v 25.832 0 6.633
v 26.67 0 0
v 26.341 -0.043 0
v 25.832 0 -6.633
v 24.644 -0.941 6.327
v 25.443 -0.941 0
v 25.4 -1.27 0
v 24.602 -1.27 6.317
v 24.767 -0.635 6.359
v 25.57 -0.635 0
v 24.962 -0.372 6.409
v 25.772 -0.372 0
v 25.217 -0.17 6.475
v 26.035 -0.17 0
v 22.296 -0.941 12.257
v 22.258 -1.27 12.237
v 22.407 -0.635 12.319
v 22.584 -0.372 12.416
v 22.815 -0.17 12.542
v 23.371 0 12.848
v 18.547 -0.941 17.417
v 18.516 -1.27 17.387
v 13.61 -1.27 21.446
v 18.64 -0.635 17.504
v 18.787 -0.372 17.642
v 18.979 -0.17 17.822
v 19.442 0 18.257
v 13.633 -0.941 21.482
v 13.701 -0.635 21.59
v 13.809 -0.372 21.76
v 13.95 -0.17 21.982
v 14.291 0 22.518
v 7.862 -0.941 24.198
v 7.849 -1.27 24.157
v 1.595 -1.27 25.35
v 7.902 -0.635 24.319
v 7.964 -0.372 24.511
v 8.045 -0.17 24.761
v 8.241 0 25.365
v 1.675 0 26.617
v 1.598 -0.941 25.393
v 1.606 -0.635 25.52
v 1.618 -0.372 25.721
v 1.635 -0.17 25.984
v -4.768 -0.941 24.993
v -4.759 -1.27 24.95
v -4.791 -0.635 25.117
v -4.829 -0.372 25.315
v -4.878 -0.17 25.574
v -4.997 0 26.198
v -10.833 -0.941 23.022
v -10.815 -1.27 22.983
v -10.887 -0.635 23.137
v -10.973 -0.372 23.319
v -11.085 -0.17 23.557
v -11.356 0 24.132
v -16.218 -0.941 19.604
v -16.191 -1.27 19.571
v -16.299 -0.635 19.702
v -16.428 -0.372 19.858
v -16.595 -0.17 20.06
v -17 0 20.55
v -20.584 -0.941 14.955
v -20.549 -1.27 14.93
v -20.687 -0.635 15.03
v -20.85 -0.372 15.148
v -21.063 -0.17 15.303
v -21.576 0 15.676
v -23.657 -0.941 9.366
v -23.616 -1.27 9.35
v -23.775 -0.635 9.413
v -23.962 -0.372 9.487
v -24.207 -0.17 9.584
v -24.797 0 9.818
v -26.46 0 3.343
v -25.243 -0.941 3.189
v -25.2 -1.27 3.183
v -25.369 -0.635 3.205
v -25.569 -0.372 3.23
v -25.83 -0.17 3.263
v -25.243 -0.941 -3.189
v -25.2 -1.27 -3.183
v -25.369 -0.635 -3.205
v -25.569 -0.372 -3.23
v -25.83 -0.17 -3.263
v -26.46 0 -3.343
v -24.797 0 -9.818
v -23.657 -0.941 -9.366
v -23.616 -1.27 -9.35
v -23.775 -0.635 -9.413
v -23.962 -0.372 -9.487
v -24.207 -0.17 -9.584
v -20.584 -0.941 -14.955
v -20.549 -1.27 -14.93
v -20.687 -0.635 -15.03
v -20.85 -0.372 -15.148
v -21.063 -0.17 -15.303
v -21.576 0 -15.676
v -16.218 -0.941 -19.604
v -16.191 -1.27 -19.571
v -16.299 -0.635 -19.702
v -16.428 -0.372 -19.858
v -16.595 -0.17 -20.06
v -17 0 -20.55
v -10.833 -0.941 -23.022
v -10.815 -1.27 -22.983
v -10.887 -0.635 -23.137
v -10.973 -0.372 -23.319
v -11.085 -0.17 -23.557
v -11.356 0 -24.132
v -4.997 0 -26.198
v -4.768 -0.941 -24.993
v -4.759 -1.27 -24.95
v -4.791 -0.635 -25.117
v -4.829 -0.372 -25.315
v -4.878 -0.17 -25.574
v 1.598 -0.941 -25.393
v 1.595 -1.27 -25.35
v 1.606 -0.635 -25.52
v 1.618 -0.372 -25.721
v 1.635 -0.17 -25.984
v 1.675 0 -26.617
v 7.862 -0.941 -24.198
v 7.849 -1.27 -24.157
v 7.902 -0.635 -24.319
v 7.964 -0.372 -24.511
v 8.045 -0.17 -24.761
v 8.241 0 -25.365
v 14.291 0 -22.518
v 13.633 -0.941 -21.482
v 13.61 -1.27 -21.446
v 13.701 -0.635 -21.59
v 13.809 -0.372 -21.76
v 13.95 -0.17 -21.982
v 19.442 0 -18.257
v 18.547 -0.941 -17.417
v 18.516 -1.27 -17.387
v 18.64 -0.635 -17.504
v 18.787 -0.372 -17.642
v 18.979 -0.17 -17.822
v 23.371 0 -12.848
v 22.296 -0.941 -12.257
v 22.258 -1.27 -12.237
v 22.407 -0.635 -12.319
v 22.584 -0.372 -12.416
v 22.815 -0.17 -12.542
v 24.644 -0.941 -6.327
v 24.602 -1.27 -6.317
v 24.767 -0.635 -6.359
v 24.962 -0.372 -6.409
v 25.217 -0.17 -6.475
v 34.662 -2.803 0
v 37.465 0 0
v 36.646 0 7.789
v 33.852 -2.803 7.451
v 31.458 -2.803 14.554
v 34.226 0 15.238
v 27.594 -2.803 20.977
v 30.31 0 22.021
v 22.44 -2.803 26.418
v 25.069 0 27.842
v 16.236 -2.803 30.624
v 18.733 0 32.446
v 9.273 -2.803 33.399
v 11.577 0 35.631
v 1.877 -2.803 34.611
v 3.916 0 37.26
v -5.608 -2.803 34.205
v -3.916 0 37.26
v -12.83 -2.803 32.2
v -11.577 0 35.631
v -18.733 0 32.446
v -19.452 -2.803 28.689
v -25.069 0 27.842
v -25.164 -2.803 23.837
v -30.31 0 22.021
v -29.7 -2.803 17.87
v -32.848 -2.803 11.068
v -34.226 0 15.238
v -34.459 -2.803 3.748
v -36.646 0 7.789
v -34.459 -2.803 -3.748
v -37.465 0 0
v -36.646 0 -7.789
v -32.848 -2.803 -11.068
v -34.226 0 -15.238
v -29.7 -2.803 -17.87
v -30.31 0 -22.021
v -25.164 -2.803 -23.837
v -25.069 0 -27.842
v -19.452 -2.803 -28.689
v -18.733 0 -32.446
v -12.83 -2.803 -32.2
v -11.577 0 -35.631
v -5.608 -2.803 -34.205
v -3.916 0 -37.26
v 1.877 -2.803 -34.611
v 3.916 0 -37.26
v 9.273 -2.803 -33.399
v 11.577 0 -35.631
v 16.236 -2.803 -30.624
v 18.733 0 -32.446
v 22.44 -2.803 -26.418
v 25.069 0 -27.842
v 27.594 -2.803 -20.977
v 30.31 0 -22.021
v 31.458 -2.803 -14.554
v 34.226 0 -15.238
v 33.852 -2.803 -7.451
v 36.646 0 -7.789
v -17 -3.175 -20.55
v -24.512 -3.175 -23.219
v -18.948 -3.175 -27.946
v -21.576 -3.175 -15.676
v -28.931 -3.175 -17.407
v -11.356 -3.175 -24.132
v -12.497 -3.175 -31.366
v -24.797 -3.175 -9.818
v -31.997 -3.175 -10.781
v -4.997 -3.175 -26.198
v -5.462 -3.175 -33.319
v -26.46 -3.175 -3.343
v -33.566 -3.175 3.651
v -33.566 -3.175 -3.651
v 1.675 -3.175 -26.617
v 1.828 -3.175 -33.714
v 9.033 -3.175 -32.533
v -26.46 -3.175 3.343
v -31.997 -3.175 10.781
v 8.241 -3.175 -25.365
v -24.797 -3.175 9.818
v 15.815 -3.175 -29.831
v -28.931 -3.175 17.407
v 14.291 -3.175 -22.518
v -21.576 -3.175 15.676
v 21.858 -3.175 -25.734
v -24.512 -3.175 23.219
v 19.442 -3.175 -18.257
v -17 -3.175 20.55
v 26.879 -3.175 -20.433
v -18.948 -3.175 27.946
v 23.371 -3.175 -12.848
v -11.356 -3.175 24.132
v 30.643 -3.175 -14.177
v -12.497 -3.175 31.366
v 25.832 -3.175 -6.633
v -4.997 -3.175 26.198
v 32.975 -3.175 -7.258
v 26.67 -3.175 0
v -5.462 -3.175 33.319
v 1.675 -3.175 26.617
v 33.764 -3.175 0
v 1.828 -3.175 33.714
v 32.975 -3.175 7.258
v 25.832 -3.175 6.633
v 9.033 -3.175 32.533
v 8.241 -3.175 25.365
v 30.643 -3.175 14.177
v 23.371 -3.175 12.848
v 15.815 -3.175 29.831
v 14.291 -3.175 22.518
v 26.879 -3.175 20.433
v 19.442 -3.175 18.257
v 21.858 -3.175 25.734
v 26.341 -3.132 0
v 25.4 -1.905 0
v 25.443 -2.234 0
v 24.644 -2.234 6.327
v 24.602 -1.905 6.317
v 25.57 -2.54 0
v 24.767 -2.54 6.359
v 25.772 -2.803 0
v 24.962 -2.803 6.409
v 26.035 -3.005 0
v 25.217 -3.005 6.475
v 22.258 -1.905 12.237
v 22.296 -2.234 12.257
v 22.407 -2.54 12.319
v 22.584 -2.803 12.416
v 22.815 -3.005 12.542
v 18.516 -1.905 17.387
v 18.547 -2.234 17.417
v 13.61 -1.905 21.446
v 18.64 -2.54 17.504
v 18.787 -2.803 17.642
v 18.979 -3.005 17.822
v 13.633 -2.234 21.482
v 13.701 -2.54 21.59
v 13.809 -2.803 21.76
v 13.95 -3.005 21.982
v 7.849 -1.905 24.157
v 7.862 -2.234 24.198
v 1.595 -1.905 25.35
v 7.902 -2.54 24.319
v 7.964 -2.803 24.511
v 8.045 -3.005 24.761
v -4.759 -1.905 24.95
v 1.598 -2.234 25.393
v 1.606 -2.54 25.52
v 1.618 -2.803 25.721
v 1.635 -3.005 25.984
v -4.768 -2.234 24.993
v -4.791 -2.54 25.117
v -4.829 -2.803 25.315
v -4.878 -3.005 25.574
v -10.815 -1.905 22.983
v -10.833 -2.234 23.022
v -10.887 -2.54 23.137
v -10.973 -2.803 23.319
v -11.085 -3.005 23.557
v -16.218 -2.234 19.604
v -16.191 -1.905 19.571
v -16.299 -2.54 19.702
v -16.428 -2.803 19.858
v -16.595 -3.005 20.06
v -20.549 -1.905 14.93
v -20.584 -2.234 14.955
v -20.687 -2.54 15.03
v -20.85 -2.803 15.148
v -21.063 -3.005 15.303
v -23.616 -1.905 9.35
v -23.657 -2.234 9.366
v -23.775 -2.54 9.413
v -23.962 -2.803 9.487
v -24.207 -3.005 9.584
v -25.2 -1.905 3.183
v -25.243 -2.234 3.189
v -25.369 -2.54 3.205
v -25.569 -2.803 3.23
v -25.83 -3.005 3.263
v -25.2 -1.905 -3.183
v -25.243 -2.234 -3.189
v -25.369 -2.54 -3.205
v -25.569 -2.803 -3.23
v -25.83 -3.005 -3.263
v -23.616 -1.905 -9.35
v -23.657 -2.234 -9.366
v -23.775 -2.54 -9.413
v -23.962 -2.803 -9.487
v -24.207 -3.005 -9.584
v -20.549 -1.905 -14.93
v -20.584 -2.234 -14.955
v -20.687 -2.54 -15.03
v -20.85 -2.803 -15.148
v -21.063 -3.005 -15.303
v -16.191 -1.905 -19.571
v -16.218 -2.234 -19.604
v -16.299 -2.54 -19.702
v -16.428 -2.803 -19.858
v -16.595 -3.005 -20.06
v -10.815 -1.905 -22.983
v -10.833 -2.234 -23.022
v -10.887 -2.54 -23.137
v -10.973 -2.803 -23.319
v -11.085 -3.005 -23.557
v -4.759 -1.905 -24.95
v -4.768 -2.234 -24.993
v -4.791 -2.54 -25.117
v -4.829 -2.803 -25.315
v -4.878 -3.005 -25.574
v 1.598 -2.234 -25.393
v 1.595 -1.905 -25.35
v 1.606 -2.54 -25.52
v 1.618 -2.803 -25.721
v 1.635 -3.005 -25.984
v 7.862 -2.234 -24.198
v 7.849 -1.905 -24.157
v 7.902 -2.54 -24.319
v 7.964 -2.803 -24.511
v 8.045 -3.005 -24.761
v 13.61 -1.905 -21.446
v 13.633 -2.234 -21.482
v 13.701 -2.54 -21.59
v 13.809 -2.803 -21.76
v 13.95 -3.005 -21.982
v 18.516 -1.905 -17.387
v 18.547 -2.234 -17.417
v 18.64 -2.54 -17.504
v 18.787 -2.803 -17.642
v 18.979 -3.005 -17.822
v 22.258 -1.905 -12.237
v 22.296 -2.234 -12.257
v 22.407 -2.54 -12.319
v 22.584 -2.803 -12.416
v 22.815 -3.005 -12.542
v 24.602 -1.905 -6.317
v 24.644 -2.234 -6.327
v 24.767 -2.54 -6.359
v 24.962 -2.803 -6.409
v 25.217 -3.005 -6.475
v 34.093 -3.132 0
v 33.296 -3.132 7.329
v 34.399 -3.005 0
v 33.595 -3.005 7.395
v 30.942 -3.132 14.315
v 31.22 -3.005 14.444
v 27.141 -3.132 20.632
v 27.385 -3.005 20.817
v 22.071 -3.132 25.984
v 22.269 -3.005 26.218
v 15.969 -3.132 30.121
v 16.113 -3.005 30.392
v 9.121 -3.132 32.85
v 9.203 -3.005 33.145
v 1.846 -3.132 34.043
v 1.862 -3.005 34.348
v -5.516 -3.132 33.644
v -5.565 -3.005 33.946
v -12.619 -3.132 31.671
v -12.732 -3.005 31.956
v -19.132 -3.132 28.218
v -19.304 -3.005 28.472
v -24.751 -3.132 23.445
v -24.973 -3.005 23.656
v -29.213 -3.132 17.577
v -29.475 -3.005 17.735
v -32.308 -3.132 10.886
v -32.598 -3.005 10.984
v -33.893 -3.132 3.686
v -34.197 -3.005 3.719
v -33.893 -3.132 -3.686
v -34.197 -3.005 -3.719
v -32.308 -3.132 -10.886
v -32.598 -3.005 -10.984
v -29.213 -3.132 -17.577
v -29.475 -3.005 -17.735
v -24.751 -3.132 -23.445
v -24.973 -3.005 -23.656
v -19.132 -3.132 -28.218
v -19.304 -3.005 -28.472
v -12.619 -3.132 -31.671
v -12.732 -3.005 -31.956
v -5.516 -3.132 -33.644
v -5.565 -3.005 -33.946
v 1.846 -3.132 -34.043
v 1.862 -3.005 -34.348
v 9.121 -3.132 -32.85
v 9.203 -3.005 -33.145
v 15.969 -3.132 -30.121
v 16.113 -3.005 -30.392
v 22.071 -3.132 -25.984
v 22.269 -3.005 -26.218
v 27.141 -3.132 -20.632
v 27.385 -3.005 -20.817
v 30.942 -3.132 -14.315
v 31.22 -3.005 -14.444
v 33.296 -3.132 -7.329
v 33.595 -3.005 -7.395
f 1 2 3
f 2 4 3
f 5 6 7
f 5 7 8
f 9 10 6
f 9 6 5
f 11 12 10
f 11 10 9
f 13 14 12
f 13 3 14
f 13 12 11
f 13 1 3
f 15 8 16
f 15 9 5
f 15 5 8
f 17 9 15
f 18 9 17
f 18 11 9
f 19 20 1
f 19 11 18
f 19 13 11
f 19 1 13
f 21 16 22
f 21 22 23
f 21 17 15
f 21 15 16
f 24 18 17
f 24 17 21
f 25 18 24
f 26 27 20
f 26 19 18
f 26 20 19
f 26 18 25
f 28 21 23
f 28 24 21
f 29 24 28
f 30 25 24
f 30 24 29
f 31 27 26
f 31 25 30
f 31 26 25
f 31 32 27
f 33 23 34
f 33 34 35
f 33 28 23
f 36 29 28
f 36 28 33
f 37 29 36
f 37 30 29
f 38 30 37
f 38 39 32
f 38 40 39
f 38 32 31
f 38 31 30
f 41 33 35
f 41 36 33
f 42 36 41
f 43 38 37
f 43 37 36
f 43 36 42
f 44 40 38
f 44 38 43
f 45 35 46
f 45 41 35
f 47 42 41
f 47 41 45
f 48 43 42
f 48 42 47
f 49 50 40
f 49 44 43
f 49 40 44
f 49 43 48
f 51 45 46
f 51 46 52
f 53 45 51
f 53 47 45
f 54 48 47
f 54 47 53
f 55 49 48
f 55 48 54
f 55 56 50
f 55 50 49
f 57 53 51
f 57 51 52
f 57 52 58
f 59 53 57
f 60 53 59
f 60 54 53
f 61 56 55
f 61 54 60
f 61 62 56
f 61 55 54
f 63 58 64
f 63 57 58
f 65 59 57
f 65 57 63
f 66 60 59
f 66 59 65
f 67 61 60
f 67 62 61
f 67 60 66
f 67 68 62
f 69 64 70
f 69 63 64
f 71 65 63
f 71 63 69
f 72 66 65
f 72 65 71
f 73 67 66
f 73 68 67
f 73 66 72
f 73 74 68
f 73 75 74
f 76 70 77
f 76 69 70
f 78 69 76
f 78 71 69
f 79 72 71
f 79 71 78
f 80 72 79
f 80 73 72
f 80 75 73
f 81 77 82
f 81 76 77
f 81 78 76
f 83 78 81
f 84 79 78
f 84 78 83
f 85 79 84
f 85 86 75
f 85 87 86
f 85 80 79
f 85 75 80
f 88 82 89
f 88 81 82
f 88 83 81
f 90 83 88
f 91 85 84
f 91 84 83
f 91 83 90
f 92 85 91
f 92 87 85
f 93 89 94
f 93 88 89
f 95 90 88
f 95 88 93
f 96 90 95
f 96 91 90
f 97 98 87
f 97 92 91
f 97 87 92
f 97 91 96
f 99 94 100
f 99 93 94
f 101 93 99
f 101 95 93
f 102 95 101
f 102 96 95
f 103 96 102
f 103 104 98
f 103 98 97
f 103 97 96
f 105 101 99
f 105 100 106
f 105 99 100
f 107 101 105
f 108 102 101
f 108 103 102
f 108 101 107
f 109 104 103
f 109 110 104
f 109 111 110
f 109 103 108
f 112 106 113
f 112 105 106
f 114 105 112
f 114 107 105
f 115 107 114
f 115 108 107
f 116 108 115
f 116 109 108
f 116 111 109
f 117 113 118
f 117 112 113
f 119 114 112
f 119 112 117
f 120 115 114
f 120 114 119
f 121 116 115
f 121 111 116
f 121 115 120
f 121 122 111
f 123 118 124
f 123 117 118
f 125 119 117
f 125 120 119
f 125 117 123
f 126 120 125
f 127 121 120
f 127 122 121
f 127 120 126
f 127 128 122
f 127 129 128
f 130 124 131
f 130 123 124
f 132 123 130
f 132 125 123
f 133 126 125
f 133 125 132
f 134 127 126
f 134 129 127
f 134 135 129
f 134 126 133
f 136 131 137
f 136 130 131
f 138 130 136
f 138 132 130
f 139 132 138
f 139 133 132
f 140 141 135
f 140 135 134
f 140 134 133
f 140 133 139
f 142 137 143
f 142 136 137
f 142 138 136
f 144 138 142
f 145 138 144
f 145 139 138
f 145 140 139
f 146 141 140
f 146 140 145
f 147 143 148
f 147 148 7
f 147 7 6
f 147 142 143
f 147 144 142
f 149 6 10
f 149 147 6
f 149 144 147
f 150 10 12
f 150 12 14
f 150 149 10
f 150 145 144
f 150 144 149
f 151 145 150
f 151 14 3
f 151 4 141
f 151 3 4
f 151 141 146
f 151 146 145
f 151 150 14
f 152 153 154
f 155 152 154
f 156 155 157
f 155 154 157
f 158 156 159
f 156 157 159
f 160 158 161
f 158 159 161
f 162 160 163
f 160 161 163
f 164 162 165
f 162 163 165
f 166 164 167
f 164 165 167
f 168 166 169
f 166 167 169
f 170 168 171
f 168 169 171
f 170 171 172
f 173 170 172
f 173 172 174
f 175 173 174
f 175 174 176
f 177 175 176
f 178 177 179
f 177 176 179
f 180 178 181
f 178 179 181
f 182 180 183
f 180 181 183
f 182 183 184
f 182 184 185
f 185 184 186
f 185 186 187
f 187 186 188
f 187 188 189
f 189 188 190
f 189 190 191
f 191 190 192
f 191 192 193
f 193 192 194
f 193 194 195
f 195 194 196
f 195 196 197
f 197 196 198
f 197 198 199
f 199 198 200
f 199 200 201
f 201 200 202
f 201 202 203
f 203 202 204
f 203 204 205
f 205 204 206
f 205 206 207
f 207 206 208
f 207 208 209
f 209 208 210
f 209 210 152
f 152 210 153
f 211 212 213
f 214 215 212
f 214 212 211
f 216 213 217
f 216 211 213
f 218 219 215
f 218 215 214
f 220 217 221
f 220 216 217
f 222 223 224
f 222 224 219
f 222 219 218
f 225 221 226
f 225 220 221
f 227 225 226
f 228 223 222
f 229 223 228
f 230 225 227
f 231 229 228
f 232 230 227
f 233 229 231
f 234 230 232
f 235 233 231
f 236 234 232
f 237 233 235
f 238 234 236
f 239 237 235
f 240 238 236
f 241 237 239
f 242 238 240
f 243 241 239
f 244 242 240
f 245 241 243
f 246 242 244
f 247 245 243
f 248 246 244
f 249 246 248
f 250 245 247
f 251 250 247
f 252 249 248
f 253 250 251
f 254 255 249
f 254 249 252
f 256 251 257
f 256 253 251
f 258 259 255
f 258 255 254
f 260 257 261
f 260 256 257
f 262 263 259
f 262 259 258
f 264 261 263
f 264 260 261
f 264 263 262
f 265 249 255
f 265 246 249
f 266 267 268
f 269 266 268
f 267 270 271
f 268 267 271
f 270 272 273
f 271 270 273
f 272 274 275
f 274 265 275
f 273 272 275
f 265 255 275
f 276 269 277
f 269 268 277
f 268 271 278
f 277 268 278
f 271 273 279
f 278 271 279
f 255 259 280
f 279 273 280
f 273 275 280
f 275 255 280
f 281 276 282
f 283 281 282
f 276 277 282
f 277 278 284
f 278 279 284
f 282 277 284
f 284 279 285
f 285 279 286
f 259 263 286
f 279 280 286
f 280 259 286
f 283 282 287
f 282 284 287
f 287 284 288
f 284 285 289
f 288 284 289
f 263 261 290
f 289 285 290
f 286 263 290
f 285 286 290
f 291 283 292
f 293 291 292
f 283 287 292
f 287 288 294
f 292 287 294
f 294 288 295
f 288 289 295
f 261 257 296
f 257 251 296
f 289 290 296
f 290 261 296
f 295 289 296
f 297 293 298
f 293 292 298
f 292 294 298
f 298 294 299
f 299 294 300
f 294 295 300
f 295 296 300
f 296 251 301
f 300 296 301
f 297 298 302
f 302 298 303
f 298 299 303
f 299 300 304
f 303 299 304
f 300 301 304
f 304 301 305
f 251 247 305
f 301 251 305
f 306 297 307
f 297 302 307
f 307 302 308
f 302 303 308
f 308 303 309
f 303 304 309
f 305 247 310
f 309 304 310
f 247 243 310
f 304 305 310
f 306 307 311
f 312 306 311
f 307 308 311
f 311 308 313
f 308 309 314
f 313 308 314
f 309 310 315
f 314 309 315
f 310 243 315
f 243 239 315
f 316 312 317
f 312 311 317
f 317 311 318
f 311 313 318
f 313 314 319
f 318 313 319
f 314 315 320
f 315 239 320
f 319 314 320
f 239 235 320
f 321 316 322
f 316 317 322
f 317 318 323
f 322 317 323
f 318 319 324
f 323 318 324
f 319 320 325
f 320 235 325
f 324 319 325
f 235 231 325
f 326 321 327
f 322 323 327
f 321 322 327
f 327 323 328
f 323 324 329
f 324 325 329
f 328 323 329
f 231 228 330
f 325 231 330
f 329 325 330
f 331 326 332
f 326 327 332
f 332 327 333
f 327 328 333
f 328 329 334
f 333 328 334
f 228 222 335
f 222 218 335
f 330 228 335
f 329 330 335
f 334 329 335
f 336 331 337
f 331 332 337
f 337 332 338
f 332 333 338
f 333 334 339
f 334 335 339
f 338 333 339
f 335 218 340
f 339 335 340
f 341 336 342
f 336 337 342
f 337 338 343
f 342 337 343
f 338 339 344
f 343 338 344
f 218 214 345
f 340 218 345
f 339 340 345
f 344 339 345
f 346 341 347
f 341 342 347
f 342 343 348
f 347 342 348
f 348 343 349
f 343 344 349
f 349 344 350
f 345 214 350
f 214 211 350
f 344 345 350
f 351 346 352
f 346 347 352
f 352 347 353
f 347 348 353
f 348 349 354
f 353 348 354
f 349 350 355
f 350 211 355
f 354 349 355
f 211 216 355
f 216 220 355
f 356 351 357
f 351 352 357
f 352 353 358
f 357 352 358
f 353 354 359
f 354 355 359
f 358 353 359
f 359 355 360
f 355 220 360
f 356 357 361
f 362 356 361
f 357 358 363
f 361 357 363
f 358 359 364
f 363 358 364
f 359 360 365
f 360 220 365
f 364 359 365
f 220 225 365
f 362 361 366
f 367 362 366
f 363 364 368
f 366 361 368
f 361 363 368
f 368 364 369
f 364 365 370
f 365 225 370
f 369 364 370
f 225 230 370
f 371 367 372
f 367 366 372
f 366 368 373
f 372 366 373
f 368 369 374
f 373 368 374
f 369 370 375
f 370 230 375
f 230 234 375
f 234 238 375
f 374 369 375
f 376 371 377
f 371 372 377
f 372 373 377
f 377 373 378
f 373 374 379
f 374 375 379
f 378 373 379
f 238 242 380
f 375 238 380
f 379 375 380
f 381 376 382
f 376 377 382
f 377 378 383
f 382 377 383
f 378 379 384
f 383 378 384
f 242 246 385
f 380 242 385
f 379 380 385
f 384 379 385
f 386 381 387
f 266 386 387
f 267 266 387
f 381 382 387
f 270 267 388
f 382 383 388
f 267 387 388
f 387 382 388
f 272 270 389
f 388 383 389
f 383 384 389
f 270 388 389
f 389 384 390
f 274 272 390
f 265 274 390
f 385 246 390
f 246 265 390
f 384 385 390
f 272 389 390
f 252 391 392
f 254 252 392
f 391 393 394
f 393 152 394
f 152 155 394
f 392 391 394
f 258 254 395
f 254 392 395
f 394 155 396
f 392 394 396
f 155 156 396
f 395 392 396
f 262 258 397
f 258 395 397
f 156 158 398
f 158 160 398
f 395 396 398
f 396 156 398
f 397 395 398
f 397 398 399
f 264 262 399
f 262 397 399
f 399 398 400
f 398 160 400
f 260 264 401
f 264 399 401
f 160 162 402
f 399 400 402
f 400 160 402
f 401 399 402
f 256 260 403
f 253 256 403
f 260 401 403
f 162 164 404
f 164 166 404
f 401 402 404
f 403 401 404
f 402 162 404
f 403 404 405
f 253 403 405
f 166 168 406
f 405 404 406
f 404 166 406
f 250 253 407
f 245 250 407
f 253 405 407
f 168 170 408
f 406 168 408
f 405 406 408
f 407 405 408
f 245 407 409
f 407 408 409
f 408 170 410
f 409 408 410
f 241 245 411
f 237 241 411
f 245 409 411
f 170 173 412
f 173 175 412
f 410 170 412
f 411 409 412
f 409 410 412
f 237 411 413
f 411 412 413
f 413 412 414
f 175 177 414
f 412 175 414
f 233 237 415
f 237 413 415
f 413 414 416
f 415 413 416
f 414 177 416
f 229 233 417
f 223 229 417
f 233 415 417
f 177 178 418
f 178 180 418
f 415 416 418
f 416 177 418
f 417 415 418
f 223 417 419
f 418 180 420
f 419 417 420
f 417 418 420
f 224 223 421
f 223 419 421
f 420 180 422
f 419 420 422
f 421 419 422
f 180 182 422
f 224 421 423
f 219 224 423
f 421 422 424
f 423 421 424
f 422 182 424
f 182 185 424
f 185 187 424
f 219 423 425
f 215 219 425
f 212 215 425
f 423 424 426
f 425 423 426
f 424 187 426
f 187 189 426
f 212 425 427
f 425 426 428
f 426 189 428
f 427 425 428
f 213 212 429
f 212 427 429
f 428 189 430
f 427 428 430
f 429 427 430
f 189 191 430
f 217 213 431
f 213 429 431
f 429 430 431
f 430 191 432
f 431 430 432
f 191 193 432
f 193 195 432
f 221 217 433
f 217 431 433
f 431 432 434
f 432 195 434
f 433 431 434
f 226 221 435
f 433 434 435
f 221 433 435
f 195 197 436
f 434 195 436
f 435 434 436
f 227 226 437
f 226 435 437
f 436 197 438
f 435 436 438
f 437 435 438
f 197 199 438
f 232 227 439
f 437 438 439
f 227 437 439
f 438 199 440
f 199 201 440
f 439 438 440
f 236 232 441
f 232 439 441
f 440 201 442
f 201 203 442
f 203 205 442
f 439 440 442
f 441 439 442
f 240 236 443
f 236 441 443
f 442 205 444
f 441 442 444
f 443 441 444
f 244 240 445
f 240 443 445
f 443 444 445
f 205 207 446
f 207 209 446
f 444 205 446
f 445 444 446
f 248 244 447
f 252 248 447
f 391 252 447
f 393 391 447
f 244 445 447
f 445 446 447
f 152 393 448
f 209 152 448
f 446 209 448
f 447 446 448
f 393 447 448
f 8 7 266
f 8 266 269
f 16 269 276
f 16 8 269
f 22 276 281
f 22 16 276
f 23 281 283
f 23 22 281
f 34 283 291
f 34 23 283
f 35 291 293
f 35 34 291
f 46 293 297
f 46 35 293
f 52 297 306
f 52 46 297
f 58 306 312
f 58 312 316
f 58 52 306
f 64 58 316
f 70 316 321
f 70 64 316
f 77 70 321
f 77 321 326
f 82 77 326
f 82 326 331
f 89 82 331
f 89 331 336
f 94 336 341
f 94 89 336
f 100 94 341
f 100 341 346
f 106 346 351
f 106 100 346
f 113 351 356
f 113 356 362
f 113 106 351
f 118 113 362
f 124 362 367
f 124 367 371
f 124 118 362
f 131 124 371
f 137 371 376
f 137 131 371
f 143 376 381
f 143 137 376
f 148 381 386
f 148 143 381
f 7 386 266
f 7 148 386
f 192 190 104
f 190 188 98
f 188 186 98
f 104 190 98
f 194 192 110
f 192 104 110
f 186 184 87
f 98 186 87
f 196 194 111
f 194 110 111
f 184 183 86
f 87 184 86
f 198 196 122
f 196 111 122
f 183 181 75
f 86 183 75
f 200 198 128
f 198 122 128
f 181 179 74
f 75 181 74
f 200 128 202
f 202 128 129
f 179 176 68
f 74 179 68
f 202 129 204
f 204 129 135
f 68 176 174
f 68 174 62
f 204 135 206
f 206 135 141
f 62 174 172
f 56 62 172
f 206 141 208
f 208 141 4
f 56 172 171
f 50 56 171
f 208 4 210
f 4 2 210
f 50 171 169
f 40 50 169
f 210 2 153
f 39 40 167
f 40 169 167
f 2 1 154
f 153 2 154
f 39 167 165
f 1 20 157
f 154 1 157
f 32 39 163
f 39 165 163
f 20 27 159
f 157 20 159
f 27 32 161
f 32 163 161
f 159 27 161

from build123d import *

# Parameters (mm, degrees)
F0_R     = 38.1
F0_R_2   = 25.4
F1_DEPTH = 3.175
F2_R     = 1.27
F3_R     = 1.27


# Not quite as in the source:
# - a fillet or chamfer that OpenCascade refuses, or shapes differently, is made with other operations: its cross-section is extruded or revolved along the edge and cut away or added


with BuildPart() as f1:
    # F0 (on Front) → F1 (new body)
    with BuildSketch(Plane.XZ):
        Circle(F0_R)
        Circle(F0_R_2, mode=Mode.SUBTRACT)
    extrude(amount=F1_DEPTH)

    # F2
    f2_edges = [f1.edges().sort_by_distance(p)[0] for p in [
        (-25.4, 0, 0),
        (-25.4, -3.175, 0),
    ]]
    fillet(f2_edges, radius=F2_R)

    # F4: chamfer of 3.81 on 1 edges, made by hand

    # F4_s1 → F4_t2 (revolve, cut)
    with BuildSketch(Plane.XY):
        Polygon((34.29, -3.175), (38.1, 0.635), (38.1, -3.175), align=None)
    revolve(axis=Axis((0, -3.175, 0), (0, -1, 0)), mode=Mode.SUBTRACT)

    # F3
    f3_edges = [f1.edges().sort_by_distance(p)[0] for p in [
        (-34.29, -3.175, 0),
    ]]
    fillet(f3_edges, radius=F3_R)


solid = f1.part
